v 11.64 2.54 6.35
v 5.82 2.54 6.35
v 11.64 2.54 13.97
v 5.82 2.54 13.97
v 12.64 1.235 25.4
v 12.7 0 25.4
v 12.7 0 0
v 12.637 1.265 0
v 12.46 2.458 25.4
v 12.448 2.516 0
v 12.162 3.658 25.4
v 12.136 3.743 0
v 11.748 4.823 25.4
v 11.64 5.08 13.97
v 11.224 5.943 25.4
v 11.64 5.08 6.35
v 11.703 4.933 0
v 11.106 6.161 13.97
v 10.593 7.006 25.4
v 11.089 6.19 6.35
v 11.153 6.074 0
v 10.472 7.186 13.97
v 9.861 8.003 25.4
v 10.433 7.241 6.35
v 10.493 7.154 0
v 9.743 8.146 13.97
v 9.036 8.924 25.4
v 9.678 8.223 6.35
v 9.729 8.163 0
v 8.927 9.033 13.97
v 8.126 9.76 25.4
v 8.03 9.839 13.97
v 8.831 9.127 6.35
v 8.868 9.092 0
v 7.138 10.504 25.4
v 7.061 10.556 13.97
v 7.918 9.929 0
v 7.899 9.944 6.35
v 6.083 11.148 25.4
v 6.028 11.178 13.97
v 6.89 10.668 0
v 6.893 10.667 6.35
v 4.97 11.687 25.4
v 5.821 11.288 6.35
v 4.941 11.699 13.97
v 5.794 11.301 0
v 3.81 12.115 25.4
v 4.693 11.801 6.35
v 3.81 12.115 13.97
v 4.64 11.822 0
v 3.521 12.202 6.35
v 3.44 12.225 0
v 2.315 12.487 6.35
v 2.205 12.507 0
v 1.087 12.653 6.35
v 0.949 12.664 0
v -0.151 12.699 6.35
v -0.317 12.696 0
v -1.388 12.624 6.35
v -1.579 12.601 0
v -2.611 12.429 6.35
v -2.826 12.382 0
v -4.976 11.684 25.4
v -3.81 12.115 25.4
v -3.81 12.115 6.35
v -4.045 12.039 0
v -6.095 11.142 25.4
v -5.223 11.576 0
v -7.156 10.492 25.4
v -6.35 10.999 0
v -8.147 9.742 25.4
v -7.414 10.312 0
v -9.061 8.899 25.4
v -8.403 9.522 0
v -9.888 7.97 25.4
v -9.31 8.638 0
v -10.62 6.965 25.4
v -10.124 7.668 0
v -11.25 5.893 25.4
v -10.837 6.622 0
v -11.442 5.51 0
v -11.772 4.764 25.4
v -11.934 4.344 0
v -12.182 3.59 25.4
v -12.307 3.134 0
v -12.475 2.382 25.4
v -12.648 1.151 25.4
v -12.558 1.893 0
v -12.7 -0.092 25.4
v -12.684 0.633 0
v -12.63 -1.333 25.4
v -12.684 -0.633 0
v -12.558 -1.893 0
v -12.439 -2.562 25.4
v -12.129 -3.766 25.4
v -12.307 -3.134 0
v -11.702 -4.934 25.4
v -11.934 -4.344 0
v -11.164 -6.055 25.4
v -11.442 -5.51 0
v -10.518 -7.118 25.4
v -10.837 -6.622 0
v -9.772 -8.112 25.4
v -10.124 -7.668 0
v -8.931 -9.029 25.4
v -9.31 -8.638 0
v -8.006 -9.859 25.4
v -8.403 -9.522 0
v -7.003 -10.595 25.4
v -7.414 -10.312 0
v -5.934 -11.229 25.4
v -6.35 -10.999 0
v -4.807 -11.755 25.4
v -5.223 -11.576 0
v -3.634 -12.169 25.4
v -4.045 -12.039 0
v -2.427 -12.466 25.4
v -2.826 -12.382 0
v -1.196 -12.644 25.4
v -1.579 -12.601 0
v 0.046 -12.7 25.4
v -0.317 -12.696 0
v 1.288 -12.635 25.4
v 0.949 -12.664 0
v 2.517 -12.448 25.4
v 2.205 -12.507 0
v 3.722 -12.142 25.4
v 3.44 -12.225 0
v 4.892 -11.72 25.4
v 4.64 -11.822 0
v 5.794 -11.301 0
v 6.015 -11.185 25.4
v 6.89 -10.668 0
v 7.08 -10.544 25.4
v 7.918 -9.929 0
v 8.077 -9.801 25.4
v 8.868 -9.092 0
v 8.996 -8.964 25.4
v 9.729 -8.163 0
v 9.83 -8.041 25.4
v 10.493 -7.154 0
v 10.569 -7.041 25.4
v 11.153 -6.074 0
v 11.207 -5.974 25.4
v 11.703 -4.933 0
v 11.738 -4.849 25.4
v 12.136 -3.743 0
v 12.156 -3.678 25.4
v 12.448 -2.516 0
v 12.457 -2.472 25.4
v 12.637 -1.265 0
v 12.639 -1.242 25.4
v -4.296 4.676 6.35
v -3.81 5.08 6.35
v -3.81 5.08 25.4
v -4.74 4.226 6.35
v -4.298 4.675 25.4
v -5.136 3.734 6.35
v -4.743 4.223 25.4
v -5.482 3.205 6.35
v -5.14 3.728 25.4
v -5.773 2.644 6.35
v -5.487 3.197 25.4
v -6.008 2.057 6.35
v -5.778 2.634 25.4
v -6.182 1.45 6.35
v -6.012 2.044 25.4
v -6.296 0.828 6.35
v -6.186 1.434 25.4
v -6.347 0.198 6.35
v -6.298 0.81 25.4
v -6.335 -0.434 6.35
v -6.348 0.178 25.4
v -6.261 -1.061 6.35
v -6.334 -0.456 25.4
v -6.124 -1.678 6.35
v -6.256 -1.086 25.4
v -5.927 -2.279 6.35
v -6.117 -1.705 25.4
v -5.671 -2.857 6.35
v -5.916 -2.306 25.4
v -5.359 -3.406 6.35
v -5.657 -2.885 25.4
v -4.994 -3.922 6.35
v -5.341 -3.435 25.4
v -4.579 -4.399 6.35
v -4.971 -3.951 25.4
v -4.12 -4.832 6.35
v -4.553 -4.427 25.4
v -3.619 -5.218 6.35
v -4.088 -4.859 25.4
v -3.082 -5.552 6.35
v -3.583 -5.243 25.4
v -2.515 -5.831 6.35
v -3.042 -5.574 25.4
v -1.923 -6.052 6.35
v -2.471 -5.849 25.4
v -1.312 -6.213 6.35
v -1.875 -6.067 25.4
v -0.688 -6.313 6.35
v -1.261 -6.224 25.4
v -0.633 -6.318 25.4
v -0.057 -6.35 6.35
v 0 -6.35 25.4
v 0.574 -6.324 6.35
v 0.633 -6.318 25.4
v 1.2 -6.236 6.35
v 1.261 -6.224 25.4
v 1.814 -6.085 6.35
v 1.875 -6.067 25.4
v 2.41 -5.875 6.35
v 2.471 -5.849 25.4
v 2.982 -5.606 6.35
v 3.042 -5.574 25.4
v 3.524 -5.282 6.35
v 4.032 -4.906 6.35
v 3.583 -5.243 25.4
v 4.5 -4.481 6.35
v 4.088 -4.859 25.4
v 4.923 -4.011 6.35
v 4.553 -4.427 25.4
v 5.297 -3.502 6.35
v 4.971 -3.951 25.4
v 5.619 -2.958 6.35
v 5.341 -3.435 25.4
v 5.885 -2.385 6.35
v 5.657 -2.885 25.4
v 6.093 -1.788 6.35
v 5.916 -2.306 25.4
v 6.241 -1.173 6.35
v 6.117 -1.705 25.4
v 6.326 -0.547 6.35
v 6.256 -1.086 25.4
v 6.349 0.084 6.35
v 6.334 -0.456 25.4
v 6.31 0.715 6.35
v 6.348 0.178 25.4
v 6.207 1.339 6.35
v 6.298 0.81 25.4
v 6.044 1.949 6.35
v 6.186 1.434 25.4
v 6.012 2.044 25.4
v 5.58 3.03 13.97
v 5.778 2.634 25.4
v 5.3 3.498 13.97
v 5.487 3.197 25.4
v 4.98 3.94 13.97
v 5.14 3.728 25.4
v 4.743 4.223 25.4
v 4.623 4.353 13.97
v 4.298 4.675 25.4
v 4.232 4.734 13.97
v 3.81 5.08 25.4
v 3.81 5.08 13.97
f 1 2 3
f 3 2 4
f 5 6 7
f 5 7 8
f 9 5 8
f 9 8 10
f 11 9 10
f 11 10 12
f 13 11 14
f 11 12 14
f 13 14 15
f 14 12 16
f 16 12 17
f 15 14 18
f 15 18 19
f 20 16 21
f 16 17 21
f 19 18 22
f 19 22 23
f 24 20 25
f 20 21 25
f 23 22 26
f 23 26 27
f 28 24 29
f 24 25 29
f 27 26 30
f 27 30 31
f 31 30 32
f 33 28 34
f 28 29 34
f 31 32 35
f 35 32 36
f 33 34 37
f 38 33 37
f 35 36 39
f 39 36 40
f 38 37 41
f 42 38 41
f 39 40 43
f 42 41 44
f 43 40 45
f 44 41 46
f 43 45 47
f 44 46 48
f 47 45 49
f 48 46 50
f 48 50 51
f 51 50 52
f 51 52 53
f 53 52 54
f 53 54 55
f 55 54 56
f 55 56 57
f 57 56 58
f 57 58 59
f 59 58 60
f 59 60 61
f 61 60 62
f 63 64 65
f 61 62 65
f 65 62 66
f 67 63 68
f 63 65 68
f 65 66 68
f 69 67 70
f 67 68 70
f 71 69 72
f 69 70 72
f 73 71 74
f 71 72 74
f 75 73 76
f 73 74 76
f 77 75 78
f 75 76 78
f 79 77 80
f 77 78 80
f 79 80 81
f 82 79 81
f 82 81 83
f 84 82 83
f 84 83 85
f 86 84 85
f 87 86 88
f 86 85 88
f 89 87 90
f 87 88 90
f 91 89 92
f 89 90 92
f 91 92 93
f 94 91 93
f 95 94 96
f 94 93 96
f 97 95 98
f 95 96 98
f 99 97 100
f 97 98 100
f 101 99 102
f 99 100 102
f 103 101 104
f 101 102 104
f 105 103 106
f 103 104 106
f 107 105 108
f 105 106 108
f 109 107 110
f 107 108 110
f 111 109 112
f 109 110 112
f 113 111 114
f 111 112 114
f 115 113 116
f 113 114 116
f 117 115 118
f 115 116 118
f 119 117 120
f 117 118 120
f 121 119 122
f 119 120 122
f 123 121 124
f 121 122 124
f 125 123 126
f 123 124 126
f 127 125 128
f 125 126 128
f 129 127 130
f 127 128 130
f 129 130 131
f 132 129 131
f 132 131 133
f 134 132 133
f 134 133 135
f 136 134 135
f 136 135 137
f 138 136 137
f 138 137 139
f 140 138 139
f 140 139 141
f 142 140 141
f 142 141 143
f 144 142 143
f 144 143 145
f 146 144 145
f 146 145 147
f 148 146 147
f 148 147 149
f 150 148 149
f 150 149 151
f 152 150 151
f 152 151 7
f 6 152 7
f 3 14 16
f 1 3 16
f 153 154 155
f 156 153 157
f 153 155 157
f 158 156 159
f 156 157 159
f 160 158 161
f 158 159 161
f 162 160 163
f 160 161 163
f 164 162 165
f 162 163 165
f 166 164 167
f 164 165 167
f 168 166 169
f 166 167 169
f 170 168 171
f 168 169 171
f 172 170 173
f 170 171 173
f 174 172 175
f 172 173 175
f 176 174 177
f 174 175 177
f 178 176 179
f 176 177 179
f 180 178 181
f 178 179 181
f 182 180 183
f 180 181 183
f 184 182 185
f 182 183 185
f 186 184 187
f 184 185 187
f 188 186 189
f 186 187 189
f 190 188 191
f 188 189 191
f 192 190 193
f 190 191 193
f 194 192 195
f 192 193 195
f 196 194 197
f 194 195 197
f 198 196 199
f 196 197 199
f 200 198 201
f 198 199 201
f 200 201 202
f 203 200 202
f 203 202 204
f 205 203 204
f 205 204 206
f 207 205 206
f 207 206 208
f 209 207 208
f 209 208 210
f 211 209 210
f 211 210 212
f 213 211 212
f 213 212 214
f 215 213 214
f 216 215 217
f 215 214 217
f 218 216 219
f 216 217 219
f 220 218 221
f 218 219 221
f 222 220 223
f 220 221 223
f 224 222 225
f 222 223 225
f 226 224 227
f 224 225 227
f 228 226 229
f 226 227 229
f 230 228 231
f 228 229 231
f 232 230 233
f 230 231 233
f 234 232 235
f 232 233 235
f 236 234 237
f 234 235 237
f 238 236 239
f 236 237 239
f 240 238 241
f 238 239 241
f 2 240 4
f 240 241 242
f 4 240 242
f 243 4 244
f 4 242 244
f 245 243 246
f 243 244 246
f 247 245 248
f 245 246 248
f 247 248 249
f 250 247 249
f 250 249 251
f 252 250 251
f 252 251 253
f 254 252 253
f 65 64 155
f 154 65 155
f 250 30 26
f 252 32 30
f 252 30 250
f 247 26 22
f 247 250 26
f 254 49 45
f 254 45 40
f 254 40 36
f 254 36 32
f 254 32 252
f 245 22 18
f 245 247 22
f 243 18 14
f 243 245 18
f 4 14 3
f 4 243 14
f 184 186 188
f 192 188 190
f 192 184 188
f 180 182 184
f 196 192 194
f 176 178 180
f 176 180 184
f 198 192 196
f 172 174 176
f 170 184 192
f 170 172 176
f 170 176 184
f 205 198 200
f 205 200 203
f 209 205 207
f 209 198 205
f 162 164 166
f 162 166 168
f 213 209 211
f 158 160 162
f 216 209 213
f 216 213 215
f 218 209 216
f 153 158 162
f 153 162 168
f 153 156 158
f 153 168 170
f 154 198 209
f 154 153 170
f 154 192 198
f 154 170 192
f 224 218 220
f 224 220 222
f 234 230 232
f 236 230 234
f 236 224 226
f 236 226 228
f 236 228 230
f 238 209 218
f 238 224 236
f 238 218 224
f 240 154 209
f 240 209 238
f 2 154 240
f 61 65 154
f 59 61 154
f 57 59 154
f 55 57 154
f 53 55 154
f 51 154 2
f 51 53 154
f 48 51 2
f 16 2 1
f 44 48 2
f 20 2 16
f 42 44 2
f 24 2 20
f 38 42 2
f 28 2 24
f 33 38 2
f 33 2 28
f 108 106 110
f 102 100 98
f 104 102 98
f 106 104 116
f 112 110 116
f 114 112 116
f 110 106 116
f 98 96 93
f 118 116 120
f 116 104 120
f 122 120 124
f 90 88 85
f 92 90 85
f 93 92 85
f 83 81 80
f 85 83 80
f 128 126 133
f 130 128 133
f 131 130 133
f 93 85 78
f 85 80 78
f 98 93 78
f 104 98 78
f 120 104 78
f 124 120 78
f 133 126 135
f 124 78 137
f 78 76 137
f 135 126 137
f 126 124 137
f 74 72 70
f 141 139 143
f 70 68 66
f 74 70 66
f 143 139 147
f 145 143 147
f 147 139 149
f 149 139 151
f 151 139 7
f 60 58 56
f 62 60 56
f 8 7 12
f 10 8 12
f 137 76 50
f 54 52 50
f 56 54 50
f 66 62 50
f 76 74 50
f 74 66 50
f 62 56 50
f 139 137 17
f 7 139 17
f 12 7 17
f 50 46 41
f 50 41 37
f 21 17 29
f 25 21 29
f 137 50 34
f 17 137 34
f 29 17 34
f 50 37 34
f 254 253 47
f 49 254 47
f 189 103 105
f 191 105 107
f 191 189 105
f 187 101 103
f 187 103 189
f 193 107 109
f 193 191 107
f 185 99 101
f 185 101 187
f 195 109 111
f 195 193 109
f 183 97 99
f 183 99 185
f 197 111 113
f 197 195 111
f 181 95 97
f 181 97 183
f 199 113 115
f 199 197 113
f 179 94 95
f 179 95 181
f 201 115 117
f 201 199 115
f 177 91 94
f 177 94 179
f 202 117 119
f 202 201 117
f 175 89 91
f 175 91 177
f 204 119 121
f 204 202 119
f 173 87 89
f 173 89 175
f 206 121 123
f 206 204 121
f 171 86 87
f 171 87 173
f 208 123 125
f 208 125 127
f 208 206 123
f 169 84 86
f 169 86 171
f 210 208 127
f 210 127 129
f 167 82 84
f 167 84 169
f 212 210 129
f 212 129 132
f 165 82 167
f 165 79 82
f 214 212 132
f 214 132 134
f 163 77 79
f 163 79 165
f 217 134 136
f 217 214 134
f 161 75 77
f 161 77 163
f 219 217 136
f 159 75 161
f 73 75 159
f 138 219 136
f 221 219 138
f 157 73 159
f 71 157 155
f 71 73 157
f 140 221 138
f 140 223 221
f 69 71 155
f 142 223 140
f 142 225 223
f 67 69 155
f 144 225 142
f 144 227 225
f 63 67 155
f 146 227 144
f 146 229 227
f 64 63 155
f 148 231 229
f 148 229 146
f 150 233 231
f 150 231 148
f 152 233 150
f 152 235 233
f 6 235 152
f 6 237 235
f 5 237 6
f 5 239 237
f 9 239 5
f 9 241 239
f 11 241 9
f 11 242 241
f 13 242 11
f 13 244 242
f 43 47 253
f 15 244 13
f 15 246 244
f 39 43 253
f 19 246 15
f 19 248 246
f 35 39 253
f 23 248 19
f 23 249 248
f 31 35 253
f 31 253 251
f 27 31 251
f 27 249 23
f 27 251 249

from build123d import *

# Parameters (mm, degrees)
F0_R     = 12.7
F1_DEPTH = 25.4
F2_R     = 6.35
F5_DEPTH = 19.05
F6_W     = 7.035027858
F6_H     = 7.62
F7_DEPTH = 25.4
F8_DEPTH = 2.54


with BuildPart() as f1:
    # F0 (on Top) → F1 (new body)
    with BuildSketch(Plane.XY):
        Circle(F0_R)
    extrude(amount=F1_DEPTH)

    # F2 (on face) + F4 (on face) + F3 (on face) → F5 (cut)
    with BuildSketch(Plane.XY.offset(25.4)):
        Circle(F2_R)
    with BuildSketch(Plane.XY.offset(25.4)):
        with BuildLine():
            Line((0, 12.7), (0, 6.35))
            ThreePointArc((0, 6.35), (2.0080463142, 6.0241389426), (3.81, 5.08))
            Line((3.81, 5.08), (3.81, 12.7))
            Line((3.81, 12.7), (0, 12.7))
        make_face()
    with BuildSketch(Plane.XY.offset(25.4)):
        with BuildLine():
            ThreePointArc((-3.81, 5.08), (-2.0080463142, 6.0241389426), (0, 6.35))
            Line((0, 6.35), (0, 12.7))
            Line((0, 12.7), (-3.81, 12.7))
            Line((-3.81, 12.7), (-3.81, 5.08))
        make_face()
    extrude(amount=-F5_DEPTH, mode=Mode.SUBTRACT)

    # F6 (on face) → F7 (cut)
    with BuildSketch(Plane(origin=(3.81, 0, 0), x_dir=(0, -1, 0), z_dir=(-1, 0, 0))):
        with Locations((-8.597513929, 10.16)):
            Rectangle(F6_W, F6_H)
    extrude(amount=-F7_DEPTH, mode=Mode.SUBTRACT)

    # F8 (cut): a face of the model
    f8_faces = [f1.faces().sort_by_distance(p)[0] for p in [
        (7.7248711326, 5.08, 10.16),
    ]]
    extrude(f8_faces, amount=-F8_DEPTH, mode=Mode.SUBTRACT)


solid = f1.part
